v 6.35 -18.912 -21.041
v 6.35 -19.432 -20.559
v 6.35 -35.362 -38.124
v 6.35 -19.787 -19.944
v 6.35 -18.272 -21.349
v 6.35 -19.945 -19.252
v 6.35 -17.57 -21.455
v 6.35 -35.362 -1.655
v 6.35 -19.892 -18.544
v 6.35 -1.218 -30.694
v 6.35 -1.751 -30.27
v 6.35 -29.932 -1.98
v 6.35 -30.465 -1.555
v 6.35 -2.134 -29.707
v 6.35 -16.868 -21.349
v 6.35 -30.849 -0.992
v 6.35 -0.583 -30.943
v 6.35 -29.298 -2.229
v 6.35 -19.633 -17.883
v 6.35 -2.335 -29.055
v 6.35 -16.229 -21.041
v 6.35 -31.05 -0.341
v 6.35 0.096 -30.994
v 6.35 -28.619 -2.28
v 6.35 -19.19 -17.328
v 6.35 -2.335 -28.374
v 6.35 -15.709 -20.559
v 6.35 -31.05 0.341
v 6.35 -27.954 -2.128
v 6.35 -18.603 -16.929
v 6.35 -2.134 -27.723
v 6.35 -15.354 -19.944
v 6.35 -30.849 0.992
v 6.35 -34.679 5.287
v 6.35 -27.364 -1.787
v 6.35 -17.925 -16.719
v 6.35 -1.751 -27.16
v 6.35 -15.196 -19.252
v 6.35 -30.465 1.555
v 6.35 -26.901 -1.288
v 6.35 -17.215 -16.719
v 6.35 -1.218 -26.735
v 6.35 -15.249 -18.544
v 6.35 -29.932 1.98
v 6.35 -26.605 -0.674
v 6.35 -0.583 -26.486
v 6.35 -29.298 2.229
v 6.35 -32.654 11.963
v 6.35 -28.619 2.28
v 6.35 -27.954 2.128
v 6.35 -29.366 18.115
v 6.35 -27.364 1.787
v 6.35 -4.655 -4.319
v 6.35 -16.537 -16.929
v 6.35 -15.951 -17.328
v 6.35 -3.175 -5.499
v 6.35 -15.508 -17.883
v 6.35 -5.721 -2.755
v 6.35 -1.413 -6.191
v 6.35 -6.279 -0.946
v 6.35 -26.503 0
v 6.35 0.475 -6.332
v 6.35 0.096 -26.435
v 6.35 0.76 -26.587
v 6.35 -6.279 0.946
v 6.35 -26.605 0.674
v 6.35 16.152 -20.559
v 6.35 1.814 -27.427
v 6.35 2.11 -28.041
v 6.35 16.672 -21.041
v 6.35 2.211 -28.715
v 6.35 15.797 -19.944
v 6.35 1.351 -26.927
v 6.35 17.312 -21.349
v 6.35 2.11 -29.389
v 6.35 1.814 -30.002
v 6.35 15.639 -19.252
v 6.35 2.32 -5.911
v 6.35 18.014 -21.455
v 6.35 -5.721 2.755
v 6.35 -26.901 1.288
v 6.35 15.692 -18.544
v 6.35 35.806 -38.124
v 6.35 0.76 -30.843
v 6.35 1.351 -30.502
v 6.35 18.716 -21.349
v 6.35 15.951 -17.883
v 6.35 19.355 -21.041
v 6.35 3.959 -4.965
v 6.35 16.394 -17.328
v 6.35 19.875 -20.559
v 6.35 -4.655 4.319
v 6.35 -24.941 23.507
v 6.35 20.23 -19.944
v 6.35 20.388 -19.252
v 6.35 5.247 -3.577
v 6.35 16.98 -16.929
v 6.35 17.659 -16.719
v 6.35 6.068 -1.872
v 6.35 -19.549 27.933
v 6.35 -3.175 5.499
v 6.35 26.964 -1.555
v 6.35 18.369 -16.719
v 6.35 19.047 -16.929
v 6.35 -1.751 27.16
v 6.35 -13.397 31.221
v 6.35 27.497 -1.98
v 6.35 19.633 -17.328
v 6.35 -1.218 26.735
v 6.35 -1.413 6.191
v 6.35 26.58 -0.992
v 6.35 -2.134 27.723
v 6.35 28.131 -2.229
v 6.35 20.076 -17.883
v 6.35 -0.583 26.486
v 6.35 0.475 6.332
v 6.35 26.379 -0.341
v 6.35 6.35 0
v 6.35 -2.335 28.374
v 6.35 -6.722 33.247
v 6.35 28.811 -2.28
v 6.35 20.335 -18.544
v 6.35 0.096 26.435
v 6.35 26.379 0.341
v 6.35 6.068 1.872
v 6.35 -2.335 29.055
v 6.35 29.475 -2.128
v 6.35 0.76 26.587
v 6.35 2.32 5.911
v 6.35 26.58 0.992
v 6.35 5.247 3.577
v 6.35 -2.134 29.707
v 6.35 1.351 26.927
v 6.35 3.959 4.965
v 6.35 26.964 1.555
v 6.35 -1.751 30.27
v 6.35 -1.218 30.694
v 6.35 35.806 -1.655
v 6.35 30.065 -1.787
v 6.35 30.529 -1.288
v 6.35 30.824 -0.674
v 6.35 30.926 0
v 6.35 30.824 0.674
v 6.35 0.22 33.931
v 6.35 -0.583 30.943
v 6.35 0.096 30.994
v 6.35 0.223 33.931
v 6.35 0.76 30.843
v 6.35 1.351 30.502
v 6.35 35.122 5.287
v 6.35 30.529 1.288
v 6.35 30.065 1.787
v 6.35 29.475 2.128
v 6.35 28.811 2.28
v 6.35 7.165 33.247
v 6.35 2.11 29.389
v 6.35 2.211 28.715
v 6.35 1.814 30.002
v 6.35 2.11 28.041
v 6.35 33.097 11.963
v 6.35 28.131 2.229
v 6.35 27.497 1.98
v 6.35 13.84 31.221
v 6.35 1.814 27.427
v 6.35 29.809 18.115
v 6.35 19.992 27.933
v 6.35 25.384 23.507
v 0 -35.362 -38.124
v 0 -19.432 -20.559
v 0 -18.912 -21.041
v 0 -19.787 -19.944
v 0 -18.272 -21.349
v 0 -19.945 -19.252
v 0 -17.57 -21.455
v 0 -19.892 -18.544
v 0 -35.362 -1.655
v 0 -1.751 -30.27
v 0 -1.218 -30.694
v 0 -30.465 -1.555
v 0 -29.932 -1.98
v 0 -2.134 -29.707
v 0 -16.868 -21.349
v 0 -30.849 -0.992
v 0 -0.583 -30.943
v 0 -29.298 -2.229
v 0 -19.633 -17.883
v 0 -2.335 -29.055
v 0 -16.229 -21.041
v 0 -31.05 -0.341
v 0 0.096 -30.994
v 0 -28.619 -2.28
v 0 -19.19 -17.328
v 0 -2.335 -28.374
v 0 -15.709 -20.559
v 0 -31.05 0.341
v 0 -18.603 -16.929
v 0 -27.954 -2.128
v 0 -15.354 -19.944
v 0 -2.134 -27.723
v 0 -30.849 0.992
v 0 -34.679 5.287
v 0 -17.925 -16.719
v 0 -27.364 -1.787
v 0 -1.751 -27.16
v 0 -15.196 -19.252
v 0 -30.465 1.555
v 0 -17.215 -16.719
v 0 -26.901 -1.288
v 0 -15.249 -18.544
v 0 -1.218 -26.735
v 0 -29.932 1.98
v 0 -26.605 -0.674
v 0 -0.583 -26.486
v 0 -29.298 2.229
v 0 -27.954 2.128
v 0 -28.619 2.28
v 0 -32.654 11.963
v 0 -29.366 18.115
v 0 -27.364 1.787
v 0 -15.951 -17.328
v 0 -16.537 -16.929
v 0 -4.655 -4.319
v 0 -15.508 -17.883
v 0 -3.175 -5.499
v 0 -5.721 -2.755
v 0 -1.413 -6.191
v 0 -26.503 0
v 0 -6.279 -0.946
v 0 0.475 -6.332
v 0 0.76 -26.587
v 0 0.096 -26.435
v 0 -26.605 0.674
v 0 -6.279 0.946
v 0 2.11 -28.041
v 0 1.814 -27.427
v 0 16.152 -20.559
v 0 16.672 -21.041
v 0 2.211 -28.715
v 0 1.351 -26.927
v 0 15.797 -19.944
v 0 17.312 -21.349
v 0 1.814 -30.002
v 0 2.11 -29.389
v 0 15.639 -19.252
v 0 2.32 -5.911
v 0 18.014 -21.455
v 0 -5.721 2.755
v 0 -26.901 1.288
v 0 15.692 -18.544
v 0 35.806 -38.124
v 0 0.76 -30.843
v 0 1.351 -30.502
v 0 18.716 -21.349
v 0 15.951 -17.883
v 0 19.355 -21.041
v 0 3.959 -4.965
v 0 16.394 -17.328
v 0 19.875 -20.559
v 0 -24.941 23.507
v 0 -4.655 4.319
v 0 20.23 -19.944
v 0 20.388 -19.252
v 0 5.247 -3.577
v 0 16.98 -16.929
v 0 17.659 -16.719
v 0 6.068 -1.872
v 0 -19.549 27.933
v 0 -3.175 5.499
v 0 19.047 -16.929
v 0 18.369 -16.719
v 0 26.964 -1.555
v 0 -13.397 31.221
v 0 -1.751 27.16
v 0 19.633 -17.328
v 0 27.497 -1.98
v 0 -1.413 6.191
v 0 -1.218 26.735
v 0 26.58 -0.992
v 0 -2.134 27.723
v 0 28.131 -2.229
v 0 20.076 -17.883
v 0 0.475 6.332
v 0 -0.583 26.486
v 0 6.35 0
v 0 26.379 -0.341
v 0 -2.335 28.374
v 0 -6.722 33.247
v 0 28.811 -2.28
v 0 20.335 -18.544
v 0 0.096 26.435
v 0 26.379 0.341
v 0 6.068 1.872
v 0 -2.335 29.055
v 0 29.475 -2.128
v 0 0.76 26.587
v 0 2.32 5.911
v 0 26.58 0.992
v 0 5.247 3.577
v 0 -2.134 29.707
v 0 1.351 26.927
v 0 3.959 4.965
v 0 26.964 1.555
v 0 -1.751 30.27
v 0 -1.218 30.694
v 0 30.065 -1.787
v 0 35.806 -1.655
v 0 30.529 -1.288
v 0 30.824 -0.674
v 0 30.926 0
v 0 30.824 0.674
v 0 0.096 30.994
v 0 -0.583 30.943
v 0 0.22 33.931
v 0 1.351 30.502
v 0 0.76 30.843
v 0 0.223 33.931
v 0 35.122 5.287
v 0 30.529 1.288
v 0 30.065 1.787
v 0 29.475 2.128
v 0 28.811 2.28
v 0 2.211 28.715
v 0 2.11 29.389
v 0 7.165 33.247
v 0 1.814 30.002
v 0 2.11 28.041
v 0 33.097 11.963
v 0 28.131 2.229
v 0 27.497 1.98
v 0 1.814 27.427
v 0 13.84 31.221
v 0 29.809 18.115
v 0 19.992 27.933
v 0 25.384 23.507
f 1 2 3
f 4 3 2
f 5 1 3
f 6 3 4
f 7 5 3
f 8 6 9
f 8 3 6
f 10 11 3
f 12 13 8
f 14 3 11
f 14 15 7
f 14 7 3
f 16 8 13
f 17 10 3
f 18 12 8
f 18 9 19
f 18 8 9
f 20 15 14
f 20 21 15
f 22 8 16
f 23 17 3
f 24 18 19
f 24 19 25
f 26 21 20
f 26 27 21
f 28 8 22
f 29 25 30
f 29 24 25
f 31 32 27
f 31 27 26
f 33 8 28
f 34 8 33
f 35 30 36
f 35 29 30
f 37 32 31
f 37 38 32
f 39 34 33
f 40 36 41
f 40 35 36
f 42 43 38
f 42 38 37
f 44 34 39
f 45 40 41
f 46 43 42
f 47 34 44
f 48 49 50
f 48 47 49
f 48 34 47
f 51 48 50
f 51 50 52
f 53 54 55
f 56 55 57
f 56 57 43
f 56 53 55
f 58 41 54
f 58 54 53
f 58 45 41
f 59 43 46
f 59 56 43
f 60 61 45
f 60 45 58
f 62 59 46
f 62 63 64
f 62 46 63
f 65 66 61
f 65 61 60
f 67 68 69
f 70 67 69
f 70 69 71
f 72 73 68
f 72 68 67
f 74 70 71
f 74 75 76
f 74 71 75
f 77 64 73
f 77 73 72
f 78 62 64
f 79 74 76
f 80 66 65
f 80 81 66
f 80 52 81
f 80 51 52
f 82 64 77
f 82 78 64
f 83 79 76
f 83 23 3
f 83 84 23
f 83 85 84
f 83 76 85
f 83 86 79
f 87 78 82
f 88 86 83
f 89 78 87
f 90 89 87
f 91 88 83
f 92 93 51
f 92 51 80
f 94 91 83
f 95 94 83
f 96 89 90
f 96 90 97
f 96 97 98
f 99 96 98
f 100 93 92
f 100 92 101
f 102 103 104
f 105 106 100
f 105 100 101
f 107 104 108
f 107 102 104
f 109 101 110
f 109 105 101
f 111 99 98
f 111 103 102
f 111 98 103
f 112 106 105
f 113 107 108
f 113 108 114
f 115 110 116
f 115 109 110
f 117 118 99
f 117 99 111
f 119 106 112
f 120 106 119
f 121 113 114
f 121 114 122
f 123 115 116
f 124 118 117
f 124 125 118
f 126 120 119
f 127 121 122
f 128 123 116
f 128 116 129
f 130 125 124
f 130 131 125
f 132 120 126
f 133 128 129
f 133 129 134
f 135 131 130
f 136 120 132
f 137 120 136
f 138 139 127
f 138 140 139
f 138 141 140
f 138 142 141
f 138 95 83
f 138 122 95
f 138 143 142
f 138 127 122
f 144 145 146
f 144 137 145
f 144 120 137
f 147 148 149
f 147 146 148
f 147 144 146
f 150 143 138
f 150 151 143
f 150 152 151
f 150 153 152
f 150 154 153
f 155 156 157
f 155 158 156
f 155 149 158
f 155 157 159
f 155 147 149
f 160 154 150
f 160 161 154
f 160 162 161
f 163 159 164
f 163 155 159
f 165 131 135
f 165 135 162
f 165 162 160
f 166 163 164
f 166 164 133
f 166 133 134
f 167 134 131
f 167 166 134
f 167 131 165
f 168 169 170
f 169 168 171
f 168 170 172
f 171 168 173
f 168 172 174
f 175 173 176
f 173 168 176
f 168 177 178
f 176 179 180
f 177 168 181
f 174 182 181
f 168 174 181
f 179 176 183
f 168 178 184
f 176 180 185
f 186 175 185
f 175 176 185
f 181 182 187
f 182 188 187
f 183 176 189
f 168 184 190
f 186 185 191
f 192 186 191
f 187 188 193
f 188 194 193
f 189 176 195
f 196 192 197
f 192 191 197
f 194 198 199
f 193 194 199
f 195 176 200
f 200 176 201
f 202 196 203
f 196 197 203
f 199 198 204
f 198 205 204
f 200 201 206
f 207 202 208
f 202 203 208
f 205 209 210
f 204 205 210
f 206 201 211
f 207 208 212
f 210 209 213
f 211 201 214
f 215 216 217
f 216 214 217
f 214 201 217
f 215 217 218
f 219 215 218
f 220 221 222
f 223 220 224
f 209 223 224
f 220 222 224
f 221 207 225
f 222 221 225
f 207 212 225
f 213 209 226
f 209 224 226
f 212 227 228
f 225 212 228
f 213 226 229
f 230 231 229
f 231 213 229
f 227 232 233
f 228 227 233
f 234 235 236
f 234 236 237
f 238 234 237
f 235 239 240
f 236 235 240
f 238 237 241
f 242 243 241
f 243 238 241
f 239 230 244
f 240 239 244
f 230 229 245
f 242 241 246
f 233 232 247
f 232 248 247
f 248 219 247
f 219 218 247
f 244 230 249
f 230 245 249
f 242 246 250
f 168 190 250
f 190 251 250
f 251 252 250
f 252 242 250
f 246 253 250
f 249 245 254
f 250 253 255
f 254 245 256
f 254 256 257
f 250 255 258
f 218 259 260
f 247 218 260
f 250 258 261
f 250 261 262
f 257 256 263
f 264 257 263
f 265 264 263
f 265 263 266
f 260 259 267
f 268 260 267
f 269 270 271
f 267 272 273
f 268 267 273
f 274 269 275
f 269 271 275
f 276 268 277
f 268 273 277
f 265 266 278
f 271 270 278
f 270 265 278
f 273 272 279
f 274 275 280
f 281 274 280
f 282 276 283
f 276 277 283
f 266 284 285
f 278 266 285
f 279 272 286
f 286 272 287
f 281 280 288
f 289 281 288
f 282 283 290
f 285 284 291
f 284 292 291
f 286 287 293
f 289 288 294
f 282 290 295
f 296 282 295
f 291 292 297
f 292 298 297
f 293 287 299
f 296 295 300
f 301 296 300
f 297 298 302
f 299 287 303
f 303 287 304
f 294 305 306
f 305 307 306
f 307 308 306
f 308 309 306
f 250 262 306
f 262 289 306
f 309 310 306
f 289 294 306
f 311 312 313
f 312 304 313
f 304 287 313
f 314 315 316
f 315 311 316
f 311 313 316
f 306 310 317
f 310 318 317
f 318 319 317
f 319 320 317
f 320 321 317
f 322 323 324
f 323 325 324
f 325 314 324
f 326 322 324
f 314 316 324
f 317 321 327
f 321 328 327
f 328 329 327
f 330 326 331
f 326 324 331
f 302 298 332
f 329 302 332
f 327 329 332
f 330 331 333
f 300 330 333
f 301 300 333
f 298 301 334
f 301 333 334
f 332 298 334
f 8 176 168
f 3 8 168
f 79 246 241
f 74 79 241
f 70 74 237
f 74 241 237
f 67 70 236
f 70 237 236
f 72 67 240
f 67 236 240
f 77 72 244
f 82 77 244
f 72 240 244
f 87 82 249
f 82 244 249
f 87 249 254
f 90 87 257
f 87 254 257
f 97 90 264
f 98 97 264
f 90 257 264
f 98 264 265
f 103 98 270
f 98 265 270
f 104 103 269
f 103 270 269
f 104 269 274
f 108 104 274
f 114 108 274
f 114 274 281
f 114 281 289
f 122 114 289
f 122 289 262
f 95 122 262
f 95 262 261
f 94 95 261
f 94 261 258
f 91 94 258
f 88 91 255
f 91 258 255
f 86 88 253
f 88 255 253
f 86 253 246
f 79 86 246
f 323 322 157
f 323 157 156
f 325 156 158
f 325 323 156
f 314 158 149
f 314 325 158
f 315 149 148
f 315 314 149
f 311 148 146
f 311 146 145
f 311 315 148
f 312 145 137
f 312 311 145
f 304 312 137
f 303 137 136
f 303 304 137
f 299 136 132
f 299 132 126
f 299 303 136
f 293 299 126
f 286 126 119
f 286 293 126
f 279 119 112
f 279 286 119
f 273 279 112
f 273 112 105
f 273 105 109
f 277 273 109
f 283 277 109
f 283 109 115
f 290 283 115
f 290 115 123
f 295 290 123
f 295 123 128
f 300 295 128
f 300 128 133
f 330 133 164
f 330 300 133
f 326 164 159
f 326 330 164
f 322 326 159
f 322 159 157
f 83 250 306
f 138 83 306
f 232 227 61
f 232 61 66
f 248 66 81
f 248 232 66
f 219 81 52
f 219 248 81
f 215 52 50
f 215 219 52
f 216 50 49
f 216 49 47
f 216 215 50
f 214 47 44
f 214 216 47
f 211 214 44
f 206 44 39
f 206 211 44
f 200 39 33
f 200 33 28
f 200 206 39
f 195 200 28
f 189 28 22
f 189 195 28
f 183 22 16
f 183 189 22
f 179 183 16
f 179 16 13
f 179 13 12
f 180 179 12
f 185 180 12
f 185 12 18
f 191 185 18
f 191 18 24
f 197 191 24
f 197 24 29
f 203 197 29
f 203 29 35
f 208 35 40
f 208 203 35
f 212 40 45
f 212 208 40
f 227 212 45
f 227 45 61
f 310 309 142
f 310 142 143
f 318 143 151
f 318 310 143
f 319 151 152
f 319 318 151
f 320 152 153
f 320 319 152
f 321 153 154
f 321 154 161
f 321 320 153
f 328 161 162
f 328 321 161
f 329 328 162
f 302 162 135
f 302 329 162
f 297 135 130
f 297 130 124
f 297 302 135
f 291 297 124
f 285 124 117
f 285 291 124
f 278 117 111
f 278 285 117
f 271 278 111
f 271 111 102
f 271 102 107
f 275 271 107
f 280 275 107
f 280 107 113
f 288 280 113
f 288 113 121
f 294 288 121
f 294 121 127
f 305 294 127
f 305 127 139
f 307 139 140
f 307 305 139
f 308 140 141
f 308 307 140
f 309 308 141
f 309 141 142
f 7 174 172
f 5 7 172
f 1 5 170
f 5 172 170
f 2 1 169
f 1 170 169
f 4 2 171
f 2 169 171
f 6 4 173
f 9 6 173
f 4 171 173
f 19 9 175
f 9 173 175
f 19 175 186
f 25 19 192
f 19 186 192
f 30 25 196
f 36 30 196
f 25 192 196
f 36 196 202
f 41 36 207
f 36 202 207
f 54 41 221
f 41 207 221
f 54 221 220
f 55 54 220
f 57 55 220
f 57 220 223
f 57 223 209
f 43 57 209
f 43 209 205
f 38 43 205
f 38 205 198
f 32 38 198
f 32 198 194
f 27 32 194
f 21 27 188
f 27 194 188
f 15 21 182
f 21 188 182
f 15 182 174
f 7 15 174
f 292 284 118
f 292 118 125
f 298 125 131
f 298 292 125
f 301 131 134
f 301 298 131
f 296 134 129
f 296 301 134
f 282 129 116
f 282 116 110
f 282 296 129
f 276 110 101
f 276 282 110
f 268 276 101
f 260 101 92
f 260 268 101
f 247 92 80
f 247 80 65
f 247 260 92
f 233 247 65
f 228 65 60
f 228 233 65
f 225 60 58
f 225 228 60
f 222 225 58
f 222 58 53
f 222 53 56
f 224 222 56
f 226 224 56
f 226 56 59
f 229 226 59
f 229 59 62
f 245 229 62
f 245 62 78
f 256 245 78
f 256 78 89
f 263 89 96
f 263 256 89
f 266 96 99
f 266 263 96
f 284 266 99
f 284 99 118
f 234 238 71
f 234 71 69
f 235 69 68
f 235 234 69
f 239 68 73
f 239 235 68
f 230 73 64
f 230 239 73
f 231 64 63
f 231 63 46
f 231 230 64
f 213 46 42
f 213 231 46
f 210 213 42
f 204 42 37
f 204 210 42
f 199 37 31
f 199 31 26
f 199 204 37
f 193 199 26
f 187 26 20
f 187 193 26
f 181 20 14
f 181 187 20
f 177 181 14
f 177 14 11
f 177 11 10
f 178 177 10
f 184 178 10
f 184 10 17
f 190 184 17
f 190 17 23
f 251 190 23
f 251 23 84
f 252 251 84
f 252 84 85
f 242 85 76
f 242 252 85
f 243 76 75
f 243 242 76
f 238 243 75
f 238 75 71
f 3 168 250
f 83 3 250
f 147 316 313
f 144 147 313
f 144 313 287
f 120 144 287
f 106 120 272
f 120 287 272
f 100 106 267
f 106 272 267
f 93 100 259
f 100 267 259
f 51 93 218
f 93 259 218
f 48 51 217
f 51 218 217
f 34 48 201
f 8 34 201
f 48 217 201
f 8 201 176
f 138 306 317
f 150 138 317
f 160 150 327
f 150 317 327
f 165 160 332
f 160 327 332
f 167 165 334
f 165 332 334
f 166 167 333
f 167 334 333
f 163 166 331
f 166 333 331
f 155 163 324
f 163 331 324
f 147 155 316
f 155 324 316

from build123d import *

# Parameters (mm, degrees)
F0_R     = 2.286
F0_R_2   = 6.35
F1_DEPTH = 6.35


# Not quite as in the source:
# - ends of sketch curves that miss each other by under 0.0002 mm in the source are joined


with BuildPart() as f1:
    # F0 (on Right) → F1 (new body)
    with BuildSketch(Plane.YZ):
        with BuildLine():
            Line((-35.36227718, -1.6545656172), (-35.36227718, -38.1239391863))
            Line((-35.36227718, -38.1239391863), (-17.5702907145, -38.1239391863))
            Line((-17.5702907145, -38.1239391863), (0.221695751, -38.1239391863))
            Line((0.221695751, -38.1239391863), (18.0136822164, -38.1239391863))
            Line((18.0136822164, -38.1239391863), (35.8056686819, -38.1239391863))
            Line((35.8056686819, -38.1239391863), (35.8056686819, -1.6545656172))
            ThreePointArc((35.8056686819, -1.6545656172), (25.3839554031, 23.5071029235), (0.22312282, 33.9308342683))
            Line((0.22312282, 33.9308342683), (0.2202686819, 33.9308343828))
            ThreePointArc((0.2202686819, 33.9308343828), (-24.9405639012, 23.5071029235), (-35.36227718, -1.6545656172))
        make_face()
        with Locations((-0.074788043, -28.7147061436)):
            Circle(F0_R, mode=Mode.SUBTRACT)
        with BuildLine():
            ThreePointArc((-15.1890407145, -19.0739391863), (-15.8864926918, -20.757737209), (-17.5702907145, -21.4551891863))
            ThreePointArc((-17.5702907145, -21.4551891863), (-19.2540887372, -17.3901411636), (-15.1890407145, -19.0739391863))
        make_face(mode=Mode.SUBTRACT)
        with BuildLine():
            ThreePointArc((20.3949322164, -19.0739391863), (19.6974802391, -20.757737209), (18.0136822164, -21.4551891863))
            ThreePointArc((18.0136822164, -21.4551891863), (16.3298841937, -17.3901411636), (20.3949322164, -19.0739391863))
        make_face(mode=Mode.SUBTRACT)
        with Locations((-28.7894941866, 0)):
            Circle(F0_R, mode=Mode.SUBTRACT)
        Circle(F0_R_2, mode=Mode.SUBTRACT)
        with Locations((-0.0747941866, 28.7147)):
            Circle(F0_R, mode=Mode.SUBTRACT)
        with Locations((28.639911957, -6.1436e-06)):
            Circle(F0_R, mode=Mode.SUBTRACT)
    extrude(amount=F1_DEPTH)


solid = f1.part
